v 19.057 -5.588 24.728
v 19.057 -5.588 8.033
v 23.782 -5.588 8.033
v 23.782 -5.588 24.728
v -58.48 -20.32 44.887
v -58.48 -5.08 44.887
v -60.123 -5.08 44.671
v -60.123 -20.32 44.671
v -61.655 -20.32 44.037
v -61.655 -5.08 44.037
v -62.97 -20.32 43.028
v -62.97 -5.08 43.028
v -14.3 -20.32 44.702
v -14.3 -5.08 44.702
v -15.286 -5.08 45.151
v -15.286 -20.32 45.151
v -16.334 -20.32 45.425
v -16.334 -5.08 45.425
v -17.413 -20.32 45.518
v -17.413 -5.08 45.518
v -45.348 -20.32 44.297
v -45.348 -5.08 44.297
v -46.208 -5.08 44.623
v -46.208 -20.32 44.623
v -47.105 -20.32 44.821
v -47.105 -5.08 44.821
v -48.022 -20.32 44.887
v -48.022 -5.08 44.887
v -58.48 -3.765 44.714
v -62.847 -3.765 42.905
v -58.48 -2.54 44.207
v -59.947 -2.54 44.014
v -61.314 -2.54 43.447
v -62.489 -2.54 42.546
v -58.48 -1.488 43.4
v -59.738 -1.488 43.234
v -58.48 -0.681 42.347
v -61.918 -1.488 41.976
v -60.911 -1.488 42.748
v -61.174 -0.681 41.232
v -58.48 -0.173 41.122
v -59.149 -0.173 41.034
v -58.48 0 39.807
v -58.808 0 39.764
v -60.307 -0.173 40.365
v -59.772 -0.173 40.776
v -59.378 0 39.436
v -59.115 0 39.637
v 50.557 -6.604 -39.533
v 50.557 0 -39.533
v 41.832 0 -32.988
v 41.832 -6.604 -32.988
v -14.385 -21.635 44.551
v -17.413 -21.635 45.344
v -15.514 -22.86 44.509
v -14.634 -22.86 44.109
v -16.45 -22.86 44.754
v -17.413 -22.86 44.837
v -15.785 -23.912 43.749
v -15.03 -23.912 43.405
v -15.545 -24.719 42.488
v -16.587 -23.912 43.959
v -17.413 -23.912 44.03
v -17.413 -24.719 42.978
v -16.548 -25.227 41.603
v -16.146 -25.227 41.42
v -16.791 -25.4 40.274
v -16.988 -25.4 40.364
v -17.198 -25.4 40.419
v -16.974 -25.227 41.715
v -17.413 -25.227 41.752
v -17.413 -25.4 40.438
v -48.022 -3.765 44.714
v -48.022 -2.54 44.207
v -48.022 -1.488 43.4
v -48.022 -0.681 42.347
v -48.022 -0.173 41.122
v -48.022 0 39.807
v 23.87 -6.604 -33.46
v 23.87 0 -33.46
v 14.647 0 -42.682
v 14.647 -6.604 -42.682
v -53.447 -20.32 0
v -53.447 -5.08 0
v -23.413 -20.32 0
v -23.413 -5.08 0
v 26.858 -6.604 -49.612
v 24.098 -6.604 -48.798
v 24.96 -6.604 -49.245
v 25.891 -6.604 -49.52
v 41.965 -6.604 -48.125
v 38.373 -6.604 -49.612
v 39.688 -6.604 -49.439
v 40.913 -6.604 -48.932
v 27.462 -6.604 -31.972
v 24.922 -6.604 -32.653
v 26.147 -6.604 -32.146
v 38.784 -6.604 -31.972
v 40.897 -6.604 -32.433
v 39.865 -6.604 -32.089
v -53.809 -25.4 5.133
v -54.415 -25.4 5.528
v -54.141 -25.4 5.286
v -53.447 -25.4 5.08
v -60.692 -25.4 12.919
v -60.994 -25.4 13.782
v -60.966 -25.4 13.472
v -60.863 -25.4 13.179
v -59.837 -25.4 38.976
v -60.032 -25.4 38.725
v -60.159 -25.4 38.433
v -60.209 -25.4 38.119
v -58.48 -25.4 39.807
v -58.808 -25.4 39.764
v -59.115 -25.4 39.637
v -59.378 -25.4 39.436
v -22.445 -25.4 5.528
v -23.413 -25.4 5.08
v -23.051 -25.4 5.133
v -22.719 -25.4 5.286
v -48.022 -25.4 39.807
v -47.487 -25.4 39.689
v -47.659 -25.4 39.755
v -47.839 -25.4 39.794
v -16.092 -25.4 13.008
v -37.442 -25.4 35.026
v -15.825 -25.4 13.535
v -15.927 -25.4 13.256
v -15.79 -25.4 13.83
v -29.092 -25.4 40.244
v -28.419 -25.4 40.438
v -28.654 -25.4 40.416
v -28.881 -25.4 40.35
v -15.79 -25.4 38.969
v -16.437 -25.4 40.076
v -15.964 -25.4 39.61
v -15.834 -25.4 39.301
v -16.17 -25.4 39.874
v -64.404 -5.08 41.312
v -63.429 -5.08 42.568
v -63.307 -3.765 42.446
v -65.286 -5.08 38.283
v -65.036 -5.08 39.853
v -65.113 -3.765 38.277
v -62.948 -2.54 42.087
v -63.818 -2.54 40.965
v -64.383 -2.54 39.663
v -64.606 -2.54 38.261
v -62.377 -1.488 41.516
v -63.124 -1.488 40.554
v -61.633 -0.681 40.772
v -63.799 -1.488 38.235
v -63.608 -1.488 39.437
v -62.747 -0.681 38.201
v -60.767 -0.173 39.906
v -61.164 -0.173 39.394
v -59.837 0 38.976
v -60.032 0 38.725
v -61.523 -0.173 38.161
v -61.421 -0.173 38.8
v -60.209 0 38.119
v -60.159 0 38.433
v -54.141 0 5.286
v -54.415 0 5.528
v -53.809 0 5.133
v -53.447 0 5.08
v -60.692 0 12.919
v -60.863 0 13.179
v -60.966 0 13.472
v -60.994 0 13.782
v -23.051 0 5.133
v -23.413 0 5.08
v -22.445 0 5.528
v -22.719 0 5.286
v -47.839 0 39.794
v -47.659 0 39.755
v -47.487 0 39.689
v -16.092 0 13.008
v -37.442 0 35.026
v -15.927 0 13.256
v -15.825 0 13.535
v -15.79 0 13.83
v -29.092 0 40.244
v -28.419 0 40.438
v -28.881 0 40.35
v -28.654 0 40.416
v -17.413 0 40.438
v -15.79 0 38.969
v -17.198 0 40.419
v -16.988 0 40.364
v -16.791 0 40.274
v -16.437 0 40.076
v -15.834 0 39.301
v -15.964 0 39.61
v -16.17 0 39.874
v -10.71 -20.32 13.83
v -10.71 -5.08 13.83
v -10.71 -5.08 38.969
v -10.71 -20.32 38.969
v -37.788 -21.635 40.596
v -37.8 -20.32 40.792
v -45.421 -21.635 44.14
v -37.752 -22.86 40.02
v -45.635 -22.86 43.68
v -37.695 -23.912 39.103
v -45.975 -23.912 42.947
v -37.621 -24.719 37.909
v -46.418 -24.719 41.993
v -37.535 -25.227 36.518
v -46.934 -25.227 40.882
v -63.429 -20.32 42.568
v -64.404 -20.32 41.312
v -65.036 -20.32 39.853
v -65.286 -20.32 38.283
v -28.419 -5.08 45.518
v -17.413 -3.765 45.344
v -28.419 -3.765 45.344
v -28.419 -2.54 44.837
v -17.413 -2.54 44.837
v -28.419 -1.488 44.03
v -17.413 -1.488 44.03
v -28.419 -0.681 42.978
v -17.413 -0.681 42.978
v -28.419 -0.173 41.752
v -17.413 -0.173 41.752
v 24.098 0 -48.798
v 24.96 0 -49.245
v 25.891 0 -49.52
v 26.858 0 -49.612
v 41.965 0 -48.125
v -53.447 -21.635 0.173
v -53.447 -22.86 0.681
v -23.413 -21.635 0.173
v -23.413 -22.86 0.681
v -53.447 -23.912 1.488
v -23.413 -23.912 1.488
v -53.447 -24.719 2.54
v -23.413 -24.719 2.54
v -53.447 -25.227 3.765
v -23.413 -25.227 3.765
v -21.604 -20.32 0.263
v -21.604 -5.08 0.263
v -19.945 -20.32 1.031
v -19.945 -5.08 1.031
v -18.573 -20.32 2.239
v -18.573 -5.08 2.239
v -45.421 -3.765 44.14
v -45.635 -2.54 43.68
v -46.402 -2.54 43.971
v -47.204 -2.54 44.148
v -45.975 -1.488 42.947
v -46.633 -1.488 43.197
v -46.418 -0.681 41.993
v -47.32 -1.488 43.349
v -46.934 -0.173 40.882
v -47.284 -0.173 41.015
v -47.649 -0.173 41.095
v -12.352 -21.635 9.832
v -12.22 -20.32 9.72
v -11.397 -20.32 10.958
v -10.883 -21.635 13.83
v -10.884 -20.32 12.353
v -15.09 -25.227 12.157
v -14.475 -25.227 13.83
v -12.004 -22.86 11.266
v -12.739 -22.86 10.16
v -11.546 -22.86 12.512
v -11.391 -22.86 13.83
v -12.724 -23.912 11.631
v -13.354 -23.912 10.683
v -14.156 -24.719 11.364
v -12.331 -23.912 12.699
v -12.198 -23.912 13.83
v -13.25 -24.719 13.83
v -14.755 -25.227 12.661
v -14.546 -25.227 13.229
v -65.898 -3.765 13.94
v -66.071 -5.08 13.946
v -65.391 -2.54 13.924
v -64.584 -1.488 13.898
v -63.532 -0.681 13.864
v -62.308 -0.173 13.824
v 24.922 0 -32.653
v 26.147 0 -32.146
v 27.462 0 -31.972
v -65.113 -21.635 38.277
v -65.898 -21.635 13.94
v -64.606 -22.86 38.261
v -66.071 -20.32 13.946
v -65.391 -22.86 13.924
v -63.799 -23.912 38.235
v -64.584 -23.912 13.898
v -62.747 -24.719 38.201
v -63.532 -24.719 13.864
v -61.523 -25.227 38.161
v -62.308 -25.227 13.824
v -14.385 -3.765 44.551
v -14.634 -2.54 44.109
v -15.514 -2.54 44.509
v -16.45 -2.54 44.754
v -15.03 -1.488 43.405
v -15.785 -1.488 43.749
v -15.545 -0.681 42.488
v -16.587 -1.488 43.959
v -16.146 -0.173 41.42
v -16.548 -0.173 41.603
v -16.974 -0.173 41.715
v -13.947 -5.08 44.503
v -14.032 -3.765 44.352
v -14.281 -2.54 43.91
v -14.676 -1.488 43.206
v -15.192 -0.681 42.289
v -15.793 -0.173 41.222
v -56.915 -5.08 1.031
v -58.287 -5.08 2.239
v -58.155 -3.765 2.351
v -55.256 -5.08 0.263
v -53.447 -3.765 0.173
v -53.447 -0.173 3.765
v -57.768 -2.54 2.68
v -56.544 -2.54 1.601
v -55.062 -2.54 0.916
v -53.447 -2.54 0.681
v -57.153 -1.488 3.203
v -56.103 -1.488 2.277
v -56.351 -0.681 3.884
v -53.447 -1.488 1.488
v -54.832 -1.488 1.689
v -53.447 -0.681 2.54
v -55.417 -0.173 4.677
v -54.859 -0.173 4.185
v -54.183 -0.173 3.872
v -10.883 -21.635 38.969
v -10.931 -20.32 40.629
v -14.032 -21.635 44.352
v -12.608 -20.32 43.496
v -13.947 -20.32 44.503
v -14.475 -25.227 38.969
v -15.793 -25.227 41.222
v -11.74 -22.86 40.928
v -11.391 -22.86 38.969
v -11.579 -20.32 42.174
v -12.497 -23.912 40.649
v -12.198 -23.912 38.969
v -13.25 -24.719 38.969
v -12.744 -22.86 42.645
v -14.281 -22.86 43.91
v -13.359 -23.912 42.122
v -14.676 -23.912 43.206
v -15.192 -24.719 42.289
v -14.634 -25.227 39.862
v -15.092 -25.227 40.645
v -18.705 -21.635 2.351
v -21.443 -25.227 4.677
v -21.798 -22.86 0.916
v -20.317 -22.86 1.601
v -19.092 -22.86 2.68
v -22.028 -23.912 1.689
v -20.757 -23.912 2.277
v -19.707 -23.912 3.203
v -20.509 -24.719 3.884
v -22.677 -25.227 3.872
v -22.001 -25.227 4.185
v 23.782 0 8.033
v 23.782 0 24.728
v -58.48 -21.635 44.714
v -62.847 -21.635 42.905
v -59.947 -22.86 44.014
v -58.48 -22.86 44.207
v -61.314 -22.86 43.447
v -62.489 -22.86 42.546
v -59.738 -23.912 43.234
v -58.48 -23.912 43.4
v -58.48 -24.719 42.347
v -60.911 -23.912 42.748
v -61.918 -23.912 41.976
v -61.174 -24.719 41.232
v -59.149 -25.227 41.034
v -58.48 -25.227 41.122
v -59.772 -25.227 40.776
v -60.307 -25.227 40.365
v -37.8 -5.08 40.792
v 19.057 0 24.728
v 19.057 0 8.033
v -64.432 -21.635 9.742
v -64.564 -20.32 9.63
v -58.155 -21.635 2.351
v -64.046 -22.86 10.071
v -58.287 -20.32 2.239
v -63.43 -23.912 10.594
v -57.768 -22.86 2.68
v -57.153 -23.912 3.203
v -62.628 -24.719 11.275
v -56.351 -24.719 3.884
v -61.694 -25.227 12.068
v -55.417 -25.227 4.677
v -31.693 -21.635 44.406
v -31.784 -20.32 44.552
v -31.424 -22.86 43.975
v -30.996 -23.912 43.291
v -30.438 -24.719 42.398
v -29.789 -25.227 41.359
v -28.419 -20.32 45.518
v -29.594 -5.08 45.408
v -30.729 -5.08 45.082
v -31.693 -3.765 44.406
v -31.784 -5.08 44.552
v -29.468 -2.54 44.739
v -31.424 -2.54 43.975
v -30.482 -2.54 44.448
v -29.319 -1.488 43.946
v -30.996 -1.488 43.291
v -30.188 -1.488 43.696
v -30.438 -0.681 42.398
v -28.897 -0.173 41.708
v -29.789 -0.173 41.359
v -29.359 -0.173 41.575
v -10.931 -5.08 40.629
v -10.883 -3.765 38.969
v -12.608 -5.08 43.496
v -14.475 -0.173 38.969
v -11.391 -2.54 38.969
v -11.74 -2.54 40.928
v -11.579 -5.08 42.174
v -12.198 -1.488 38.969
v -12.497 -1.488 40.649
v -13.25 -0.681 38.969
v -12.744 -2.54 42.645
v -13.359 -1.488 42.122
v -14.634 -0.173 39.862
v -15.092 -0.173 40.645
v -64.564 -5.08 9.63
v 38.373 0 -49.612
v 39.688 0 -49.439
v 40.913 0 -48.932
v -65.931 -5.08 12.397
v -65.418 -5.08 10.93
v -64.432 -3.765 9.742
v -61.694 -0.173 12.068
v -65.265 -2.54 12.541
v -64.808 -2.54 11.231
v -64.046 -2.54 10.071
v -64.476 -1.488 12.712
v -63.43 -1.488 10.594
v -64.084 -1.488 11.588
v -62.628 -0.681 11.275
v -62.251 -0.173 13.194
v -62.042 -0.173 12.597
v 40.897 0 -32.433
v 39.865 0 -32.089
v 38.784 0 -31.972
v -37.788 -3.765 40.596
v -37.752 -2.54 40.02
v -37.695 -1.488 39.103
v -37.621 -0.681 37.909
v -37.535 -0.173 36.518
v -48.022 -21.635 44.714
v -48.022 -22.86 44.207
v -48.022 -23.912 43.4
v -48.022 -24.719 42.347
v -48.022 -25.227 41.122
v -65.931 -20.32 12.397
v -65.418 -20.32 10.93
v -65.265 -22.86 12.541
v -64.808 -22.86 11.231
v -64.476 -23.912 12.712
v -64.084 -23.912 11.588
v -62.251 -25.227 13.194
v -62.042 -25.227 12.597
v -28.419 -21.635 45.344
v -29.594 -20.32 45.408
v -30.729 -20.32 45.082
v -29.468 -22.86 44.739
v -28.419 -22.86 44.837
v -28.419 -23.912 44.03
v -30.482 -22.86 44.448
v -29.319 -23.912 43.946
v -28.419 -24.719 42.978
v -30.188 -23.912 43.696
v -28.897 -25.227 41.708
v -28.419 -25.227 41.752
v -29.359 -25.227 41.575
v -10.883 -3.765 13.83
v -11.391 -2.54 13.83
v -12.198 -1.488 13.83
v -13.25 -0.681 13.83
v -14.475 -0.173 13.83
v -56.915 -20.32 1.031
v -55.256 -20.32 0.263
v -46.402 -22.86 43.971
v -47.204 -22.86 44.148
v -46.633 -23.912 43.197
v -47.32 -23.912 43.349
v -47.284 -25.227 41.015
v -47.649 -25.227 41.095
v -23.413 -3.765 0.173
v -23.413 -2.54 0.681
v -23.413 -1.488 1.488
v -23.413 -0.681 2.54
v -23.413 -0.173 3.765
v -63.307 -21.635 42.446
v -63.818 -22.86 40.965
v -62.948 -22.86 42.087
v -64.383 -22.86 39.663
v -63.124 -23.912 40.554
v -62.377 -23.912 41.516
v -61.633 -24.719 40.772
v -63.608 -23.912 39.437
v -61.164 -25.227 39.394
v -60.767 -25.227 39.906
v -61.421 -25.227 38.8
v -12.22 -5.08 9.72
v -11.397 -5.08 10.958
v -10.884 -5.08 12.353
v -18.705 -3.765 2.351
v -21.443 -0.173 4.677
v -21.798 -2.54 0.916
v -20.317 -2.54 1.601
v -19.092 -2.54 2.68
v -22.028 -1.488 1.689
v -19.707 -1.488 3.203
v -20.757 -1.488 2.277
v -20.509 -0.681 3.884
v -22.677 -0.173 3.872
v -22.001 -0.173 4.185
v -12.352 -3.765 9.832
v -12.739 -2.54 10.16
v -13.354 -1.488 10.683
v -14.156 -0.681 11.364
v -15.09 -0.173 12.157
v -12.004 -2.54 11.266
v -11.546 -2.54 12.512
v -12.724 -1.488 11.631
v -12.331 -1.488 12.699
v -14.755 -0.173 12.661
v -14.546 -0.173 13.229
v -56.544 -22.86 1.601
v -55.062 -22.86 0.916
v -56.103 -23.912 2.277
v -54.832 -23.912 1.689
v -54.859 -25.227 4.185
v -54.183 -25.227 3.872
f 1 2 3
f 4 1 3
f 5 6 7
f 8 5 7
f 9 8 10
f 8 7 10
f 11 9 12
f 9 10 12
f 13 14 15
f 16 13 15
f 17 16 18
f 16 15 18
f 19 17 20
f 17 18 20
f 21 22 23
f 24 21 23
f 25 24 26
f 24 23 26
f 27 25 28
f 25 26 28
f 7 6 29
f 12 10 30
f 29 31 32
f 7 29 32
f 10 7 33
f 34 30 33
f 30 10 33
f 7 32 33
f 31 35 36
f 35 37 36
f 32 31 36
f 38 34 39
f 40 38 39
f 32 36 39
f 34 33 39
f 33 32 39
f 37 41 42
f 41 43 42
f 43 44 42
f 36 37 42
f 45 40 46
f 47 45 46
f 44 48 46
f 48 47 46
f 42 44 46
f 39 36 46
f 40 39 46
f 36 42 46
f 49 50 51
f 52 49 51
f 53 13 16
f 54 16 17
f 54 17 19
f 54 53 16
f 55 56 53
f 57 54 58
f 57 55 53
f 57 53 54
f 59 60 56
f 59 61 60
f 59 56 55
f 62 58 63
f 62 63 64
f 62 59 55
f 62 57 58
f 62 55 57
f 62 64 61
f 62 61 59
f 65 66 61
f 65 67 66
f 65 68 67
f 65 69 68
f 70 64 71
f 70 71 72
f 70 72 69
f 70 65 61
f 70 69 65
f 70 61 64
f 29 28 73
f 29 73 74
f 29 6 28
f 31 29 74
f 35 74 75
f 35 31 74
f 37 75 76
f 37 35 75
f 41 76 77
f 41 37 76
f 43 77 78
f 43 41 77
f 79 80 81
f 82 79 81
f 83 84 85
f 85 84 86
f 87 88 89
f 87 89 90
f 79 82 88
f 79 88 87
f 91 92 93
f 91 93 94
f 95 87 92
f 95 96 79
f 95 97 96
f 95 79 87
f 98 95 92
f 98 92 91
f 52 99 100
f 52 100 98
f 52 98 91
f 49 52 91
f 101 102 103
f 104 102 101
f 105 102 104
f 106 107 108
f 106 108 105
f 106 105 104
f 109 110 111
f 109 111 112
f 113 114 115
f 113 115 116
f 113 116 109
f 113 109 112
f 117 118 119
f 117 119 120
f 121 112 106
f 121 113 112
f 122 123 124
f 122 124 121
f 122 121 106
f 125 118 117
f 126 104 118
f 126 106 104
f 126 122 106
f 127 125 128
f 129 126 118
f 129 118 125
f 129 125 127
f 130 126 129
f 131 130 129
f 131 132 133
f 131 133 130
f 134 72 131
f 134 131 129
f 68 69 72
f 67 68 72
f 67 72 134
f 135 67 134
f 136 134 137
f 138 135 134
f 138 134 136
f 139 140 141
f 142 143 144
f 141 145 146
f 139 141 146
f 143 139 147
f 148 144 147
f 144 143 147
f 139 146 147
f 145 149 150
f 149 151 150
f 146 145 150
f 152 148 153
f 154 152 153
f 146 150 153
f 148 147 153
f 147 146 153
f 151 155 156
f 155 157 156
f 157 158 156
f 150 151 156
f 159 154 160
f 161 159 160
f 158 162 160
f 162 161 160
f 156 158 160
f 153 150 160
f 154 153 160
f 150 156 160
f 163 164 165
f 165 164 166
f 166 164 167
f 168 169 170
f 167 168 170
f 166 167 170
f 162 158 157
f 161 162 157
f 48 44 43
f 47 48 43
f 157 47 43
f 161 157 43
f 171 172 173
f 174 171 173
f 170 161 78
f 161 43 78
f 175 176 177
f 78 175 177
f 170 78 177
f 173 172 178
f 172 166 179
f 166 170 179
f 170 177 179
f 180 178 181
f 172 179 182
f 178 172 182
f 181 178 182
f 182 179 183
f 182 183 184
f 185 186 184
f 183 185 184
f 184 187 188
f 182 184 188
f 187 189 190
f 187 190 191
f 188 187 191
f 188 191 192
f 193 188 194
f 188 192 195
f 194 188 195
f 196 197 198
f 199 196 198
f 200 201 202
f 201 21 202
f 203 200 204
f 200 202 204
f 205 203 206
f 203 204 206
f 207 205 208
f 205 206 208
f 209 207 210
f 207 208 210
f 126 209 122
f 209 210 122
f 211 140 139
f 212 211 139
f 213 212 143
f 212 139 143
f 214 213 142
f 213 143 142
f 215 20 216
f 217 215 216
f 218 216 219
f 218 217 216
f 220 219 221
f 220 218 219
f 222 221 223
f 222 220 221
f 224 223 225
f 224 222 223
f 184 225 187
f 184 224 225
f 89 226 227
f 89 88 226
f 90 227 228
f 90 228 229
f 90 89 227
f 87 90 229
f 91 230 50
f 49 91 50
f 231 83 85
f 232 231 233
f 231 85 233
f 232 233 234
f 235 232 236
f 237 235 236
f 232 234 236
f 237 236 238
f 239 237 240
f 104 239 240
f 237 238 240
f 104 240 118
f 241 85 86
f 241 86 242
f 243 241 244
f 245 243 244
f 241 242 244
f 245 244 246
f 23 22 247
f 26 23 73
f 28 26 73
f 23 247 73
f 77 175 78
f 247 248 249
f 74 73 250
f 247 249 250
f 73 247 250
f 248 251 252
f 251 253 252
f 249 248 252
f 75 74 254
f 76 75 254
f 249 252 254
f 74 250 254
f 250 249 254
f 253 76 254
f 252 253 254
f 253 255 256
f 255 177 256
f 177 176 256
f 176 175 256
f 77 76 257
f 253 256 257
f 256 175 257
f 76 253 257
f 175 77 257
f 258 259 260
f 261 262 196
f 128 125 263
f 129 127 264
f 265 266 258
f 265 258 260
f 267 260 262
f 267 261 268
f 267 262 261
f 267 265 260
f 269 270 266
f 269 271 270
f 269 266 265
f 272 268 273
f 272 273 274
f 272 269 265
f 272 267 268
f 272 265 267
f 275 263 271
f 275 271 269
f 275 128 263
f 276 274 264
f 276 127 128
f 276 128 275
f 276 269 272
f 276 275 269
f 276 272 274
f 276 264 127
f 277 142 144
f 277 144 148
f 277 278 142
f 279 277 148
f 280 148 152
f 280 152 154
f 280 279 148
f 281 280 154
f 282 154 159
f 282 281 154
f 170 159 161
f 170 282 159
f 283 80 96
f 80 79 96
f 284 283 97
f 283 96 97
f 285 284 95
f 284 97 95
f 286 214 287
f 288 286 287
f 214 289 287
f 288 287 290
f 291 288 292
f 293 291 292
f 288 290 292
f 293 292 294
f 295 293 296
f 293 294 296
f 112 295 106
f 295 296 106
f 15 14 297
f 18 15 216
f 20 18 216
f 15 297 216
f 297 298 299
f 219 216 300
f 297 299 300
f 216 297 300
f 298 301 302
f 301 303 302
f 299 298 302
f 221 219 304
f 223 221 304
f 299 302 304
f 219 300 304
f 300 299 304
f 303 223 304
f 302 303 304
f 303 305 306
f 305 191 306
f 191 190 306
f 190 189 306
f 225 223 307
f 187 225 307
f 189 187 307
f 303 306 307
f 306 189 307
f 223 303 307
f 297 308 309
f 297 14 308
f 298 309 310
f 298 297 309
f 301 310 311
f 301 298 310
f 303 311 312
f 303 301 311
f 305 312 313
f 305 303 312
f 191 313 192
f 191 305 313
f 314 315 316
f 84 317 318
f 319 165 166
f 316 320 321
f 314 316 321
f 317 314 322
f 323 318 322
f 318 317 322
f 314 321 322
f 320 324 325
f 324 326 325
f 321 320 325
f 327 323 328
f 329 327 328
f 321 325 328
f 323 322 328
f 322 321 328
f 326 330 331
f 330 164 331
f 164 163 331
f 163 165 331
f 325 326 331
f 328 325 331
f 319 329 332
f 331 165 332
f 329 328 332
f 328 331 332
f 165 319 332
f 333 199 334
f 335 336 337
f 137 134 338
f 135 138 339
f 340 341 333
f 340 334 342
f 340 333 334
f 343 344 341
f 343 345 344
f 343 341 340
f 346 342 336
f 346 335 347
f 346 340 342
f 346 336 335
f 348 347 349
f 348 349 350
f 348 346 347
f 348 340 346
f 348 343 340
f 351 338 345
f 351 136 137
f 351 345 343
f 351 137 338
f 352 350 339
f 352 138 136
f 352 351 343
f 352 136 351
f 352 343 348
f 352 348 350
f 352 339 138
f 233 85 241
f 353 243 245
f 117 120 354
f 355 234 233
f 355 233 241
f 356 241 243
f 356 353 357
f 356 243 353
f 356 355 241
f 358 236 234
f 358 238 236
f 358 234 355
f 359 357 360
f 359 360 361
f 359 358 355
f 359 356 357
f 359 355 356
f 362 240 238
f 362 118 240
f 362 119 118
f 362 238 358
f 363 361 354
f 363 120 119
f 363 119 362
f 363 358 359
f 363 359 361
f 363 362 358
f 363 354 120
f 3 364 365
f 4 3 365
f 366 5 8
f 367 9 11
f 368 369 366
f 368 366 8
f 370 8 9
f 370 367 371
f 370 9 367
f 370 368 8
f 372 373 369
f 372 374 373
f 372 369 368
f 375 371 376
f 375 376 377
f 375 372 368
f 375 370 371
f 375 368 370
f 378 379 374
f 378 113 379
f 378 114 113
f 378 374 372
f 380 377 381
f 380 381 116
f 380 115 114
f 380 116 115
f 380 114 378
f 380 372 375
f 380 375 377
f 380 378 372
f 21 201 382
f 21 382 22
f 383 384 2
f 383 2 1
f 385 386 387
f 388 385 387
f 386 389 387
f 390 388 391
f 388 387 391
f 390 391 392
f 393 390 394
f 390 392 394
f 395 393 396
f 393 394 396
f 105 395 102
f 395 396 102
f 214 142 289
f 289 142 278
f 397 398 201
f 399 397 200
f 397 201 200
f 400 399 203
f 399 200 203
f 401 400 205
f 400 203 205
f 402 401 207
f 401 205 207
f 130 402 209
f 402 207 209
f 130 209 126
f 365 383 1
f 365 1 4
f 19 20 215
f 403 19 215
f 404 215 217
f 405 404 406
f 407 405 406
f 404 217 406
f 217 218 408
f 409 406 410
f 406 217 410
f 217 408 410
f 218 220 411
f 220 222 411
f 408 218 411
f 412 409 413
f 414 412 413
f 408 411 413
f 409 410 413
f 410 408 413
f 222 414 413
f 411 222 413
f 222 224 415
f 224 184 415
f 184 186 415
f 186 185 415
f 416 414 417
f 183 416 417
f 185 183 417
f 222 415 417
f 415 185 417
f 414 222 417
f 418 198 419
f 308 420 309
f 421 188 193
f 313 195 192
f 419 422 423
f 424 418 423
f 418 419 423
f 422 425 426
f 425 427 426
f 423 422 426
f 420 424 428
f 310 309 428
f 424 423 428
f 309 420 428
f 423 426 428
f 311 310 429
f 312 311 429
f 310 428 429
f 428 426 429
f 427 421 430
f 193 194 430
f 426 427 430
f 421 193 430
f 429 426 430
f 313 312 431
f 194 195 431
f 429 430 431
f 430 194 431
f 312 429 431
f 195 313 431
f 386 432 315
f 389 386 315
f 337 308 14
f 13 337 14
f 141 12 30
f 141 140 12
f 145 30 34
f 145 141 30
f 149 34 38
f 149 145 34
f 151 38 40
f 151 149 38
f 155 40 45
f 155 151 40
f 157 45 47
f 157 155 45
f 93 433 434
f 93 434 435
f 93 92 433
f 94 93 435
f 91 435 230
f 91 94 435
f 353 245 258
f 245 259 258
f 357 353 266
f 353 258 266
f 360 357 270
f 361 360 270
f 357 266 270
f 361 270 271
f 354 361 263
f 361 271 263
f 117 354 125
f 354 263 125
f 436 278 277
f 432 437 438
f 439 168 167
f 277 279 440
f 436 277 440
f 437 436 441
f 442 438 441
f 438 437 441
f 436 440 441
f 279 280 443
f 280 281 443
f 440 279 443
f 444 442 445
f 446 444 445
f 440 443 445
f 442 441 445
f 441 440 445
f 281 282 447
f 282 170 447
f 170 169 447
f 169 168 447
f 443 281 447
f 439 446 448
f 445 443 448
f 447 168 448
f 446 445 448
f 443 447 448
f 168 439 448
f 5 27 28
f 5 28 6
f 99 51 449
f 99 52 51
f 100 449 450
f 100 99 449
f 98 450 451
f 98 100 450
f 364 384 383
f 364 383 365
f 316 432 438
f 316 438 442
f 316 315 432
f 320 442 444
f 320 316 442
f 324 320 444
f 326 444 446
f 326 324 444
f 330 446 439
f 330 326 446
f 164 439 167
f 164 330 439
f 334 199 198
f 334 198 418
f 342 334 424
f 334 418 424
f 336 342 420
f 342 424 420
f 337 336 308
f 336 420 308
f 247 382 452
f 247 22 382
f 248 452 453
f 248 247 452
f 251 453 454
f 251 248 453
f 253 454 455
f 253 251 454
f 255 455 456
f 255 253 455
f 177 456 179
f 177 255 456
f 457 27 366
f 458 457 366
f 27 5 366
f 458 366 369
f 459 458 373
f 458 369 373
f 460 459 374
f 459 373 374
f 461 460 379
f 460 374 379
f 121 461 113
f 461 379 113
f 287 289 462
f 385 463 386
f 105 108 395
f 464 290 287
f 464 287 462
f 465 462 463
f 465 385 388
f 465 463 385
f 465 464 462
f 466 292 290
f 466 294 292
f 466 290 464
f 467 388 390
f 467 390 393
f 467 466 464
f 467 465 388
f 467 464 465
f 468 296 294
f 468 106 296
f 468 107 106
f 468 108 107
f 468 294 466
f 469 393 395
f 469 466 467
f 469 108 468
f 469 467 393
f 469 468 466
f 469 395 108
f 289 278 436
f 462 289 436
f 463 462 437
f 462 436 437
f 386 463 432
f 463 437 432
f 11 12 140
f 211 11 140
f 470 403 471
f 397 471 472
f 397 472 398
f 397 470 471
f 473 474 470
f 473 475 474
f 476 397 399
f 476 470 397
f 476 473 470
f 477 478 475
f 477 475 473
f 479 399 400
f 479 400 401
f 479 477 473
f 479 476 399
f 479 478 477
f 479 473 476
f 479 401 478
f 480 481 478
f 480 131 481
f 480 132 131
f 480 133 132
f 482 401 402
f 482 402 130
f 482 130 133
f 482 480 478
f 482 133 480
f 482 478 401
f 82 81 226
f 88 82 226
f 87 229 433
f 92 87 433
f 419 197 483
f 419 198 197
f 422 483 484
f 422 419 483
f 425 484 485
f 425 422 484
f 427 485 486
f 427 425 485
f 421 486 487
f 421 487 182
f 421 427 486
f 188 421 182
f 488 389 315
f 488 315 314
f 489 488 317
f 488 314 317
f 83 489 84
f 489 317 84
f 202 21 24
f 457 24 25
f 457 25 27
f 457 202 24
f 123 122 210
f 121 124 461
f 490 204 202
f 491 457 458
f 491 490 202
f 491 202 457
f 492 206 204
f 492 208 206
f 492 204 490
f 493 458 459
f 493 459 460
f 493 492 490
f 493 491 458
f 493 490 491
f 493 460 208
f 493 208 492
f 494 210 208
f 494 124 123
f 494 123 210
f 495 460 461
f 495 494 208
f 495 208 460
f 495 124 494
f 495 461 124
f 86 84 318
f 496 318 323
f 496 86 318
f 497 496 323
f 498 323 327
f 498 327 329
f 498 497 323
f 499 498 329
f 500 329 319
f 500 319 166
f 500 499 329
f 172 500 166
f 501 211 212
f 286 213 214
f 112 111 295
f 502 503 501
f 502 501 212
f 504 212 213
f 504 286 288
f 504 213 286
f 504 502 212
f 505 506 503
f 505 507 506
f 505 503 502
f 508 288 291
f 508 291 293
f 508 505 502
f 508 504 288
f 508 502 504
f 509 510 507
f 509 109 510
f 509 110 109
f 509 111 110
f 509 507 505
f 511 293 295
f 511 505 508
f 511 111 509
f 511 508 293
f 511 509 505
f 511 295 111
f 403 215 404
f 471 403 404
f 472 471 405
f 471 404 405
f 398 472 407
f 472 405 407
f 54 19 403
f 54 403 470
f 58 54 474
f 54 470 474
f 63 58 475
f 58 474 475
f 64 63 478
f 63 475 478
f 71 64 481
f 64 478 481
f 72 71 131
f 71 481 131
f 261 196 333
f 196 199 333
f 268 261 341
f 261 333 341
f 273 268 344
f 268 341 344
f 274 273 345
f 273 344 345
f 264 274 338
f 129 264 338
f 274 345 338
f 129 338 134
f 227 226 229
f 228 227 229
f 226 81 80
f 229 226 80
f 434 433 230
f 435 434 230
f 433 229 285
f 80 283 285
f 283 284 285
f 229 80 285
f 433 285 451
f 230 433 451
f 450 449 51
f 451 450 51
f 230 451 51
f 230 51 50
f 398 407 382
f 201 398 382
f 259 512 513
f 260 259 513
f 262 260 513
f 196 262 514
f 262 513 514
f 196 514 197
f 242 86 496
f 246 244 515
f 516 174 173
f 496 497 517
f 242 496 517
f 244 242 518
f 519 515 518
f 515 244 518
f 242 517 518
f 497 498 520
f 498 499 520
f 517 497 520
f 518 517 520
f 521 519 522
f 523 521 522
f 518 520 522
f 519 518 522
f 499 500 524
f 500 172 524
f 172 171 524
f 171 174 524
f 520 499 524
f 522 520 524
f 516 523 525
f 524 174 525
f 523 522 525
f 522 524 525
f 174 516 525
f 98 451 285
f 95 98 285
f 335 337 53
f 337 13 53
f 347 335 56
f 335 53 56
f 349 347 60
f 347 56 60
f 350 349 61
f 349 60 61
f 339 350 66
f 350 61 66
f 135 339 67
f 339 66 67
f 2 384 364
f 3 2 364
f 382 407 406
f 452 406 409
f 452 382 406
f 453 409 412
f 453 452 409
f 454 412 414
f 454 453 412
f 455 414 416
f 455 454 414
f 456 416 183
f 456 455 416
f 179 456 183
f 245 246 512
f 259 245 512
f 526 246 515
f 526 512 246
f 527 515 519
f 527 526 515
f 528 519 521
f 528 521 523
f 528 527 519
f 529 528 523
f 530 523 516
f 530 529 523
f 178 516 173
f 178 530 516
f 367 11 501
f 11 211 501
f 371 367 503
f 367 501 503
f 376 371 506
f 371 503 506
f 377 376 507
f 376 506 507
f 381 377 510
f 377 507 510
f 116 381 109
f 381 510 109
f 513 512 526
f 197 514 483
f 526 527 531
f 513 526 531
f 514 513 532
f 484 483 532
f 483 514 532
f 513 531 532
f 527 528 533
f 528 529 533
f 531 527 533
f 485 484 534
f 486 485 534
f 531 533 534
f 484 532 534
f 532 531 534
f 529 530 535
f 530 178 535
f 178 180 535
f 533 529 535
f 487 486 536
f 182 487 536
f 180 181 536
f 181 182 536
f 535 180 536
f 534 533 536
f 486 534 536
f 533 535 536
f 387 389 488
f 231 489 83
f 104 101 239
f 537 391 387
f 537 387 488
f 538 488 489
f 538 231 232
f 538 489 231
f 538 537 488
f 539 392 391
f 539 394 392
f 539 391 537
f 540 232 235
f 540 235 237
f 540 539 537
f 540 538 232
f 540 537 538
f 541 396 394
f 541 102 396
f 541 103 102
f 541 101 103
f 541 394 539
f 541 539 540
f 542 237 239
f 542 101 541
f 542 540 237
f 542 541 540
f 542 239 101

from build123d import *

# Parameters (mm, degrees)
F1_DEPTH = 25.4
F2_R     = 5.08
F3_W     = 4.725
F3_H     = 16.695001
F4_DEPTH = 5.588
F6_DEPTH = 6.604
F7_R     = 5.08


with BuildPart() as f1:
    # F0 (on Front) → F1 (new body)
    with BuildSketch(Plane.XZ):
        with BuildLine():
            Line((-31.784337, 44.552292), (-37.800003, 40.792499))
            Line((-37.800003, 40.792499), (-45.348169, 44.297005))
            ThreePointArc((-45.348169, 44.297005), (-46.652987, 44.738118), (-48.022226, 44.887498))
            Line((-48.022226, 44.887498), (-58.479745, 44.887498))
            ThreePointArc((-58.479745, 44.887498), (-60.909785, 44.404133), (-62.969873, 43.027626))
            Line((-62.969873, 43.027626), (-63.429391, 42.568108))
            ThreePointArc((-63.429391, 42.568108), (-64.765956, 40.602291), (-65.285961, 38.282713))
            Line((-65.285961, 38.282713), (-66.071024, 13.945811))
            ThreePointArc((-66.071024, 13.945811), (-65.719398, 11.647849), (-64.564275, 9.630435))
            Line((-64.564275, 9.630435), (-58.286919, 2.239357))
            ThreePointArc((-58.286919, 2.239357), (-56.11342, 0.586968), (-53.44697, 0))
            Line((-53.44697, 0), (-23.413032, 0))
            ThreePointArc((-23.413032, 0), (-20.746581, 0.586968), (-18.573082, 2.239357))
            Line((-18.573082, 2.239357), (-12.22005, 9.719538))
            ThreePointArc((-12.22005, 9.719538), (-11.099456, 11.640567), (-10.71, 13.830181))
            Line((-10.71, 13.830181), (-10.71, 38.96872))
            ThreePointArc((-10.71, 38.96872), (-11.578619, 42.17449), (-13.946838, 44.503223))
            Line((-13.946838, 44.503223), (-14.300231, 44.702007))
            ThreePointArc((-14.300231, 44.702007), (-15.804293, 45.310248), (-17.413394, 45.517504))
            Line((-17.413394, 45.517504), (-28.418842, 45.517504))
            ThreePointArc((-28.418842, 45.517504), (-30.169427, 45.271433), (-31.784337, 44.552292))
        make_face()
    extrude(amount=F1_DEPTH)

    # F2
    f2_edges = [f1.edges().sort_by_distance(p)[0] for p in [
        (-60.909785, -25.4, 44.404133),
        (-15.804293, 0, 45.310248),
        (-10.71, -12.7, 13.830181),
        (-10.71, -12.7, 38.96872),
        (-10.71, 0, 26.399451),
        (-10.71, -25.4, 26.399451),
        (-65.285961, -12.7, 38.282713),
        (-66.071024, -12.7, 13.945811),
        (-65.678493, 0, 26.114262),
        (-65.678493, -25.4, 26.114262),
        (-13.946838, -12.7, 44.503223),
        (-63.429391, -12.7, 42.568108),
    ]]
    fillet(f2_edges, radius=F2_R)


with BuildPart() as f4:
    # F3 (on Front) → F4 (new body)
    with BuildSketch(Plane.XZ):
        with Locations((21.419997, 16.380001)):
            Rectangle(F3_W, F3_H)
    extrude(amount=F4_DEPTH)


with BuildPart() as f6:
    # F5 (on Front) → F6 (new body)
    with BuildSketch(Plane.XZ):
        Polygon((25.357498, -31.972498), (14.647499, -42.682499), (25.357498, -49.6125), (40.477503, -49.6125), (50.557498, -39.532501), (40.477503, -31.972498), align=None)
    extrude(amount=F6_DEPTH)

    # F7
    f7_edges = [f6.edges().sort_by_distance(p)[0] for p in [
        (40.477503, -3.302, -31.972498),
        (40.477503, -3.302, -49.6125),
        (25.357498, -3.302, -49.6125),
        (25.357498, -3.302, -31.972498),
    ]]
    fillet(f7_edges, radius=F7_R)


solid = Compound([f1.part, f4.part, f6.part])
